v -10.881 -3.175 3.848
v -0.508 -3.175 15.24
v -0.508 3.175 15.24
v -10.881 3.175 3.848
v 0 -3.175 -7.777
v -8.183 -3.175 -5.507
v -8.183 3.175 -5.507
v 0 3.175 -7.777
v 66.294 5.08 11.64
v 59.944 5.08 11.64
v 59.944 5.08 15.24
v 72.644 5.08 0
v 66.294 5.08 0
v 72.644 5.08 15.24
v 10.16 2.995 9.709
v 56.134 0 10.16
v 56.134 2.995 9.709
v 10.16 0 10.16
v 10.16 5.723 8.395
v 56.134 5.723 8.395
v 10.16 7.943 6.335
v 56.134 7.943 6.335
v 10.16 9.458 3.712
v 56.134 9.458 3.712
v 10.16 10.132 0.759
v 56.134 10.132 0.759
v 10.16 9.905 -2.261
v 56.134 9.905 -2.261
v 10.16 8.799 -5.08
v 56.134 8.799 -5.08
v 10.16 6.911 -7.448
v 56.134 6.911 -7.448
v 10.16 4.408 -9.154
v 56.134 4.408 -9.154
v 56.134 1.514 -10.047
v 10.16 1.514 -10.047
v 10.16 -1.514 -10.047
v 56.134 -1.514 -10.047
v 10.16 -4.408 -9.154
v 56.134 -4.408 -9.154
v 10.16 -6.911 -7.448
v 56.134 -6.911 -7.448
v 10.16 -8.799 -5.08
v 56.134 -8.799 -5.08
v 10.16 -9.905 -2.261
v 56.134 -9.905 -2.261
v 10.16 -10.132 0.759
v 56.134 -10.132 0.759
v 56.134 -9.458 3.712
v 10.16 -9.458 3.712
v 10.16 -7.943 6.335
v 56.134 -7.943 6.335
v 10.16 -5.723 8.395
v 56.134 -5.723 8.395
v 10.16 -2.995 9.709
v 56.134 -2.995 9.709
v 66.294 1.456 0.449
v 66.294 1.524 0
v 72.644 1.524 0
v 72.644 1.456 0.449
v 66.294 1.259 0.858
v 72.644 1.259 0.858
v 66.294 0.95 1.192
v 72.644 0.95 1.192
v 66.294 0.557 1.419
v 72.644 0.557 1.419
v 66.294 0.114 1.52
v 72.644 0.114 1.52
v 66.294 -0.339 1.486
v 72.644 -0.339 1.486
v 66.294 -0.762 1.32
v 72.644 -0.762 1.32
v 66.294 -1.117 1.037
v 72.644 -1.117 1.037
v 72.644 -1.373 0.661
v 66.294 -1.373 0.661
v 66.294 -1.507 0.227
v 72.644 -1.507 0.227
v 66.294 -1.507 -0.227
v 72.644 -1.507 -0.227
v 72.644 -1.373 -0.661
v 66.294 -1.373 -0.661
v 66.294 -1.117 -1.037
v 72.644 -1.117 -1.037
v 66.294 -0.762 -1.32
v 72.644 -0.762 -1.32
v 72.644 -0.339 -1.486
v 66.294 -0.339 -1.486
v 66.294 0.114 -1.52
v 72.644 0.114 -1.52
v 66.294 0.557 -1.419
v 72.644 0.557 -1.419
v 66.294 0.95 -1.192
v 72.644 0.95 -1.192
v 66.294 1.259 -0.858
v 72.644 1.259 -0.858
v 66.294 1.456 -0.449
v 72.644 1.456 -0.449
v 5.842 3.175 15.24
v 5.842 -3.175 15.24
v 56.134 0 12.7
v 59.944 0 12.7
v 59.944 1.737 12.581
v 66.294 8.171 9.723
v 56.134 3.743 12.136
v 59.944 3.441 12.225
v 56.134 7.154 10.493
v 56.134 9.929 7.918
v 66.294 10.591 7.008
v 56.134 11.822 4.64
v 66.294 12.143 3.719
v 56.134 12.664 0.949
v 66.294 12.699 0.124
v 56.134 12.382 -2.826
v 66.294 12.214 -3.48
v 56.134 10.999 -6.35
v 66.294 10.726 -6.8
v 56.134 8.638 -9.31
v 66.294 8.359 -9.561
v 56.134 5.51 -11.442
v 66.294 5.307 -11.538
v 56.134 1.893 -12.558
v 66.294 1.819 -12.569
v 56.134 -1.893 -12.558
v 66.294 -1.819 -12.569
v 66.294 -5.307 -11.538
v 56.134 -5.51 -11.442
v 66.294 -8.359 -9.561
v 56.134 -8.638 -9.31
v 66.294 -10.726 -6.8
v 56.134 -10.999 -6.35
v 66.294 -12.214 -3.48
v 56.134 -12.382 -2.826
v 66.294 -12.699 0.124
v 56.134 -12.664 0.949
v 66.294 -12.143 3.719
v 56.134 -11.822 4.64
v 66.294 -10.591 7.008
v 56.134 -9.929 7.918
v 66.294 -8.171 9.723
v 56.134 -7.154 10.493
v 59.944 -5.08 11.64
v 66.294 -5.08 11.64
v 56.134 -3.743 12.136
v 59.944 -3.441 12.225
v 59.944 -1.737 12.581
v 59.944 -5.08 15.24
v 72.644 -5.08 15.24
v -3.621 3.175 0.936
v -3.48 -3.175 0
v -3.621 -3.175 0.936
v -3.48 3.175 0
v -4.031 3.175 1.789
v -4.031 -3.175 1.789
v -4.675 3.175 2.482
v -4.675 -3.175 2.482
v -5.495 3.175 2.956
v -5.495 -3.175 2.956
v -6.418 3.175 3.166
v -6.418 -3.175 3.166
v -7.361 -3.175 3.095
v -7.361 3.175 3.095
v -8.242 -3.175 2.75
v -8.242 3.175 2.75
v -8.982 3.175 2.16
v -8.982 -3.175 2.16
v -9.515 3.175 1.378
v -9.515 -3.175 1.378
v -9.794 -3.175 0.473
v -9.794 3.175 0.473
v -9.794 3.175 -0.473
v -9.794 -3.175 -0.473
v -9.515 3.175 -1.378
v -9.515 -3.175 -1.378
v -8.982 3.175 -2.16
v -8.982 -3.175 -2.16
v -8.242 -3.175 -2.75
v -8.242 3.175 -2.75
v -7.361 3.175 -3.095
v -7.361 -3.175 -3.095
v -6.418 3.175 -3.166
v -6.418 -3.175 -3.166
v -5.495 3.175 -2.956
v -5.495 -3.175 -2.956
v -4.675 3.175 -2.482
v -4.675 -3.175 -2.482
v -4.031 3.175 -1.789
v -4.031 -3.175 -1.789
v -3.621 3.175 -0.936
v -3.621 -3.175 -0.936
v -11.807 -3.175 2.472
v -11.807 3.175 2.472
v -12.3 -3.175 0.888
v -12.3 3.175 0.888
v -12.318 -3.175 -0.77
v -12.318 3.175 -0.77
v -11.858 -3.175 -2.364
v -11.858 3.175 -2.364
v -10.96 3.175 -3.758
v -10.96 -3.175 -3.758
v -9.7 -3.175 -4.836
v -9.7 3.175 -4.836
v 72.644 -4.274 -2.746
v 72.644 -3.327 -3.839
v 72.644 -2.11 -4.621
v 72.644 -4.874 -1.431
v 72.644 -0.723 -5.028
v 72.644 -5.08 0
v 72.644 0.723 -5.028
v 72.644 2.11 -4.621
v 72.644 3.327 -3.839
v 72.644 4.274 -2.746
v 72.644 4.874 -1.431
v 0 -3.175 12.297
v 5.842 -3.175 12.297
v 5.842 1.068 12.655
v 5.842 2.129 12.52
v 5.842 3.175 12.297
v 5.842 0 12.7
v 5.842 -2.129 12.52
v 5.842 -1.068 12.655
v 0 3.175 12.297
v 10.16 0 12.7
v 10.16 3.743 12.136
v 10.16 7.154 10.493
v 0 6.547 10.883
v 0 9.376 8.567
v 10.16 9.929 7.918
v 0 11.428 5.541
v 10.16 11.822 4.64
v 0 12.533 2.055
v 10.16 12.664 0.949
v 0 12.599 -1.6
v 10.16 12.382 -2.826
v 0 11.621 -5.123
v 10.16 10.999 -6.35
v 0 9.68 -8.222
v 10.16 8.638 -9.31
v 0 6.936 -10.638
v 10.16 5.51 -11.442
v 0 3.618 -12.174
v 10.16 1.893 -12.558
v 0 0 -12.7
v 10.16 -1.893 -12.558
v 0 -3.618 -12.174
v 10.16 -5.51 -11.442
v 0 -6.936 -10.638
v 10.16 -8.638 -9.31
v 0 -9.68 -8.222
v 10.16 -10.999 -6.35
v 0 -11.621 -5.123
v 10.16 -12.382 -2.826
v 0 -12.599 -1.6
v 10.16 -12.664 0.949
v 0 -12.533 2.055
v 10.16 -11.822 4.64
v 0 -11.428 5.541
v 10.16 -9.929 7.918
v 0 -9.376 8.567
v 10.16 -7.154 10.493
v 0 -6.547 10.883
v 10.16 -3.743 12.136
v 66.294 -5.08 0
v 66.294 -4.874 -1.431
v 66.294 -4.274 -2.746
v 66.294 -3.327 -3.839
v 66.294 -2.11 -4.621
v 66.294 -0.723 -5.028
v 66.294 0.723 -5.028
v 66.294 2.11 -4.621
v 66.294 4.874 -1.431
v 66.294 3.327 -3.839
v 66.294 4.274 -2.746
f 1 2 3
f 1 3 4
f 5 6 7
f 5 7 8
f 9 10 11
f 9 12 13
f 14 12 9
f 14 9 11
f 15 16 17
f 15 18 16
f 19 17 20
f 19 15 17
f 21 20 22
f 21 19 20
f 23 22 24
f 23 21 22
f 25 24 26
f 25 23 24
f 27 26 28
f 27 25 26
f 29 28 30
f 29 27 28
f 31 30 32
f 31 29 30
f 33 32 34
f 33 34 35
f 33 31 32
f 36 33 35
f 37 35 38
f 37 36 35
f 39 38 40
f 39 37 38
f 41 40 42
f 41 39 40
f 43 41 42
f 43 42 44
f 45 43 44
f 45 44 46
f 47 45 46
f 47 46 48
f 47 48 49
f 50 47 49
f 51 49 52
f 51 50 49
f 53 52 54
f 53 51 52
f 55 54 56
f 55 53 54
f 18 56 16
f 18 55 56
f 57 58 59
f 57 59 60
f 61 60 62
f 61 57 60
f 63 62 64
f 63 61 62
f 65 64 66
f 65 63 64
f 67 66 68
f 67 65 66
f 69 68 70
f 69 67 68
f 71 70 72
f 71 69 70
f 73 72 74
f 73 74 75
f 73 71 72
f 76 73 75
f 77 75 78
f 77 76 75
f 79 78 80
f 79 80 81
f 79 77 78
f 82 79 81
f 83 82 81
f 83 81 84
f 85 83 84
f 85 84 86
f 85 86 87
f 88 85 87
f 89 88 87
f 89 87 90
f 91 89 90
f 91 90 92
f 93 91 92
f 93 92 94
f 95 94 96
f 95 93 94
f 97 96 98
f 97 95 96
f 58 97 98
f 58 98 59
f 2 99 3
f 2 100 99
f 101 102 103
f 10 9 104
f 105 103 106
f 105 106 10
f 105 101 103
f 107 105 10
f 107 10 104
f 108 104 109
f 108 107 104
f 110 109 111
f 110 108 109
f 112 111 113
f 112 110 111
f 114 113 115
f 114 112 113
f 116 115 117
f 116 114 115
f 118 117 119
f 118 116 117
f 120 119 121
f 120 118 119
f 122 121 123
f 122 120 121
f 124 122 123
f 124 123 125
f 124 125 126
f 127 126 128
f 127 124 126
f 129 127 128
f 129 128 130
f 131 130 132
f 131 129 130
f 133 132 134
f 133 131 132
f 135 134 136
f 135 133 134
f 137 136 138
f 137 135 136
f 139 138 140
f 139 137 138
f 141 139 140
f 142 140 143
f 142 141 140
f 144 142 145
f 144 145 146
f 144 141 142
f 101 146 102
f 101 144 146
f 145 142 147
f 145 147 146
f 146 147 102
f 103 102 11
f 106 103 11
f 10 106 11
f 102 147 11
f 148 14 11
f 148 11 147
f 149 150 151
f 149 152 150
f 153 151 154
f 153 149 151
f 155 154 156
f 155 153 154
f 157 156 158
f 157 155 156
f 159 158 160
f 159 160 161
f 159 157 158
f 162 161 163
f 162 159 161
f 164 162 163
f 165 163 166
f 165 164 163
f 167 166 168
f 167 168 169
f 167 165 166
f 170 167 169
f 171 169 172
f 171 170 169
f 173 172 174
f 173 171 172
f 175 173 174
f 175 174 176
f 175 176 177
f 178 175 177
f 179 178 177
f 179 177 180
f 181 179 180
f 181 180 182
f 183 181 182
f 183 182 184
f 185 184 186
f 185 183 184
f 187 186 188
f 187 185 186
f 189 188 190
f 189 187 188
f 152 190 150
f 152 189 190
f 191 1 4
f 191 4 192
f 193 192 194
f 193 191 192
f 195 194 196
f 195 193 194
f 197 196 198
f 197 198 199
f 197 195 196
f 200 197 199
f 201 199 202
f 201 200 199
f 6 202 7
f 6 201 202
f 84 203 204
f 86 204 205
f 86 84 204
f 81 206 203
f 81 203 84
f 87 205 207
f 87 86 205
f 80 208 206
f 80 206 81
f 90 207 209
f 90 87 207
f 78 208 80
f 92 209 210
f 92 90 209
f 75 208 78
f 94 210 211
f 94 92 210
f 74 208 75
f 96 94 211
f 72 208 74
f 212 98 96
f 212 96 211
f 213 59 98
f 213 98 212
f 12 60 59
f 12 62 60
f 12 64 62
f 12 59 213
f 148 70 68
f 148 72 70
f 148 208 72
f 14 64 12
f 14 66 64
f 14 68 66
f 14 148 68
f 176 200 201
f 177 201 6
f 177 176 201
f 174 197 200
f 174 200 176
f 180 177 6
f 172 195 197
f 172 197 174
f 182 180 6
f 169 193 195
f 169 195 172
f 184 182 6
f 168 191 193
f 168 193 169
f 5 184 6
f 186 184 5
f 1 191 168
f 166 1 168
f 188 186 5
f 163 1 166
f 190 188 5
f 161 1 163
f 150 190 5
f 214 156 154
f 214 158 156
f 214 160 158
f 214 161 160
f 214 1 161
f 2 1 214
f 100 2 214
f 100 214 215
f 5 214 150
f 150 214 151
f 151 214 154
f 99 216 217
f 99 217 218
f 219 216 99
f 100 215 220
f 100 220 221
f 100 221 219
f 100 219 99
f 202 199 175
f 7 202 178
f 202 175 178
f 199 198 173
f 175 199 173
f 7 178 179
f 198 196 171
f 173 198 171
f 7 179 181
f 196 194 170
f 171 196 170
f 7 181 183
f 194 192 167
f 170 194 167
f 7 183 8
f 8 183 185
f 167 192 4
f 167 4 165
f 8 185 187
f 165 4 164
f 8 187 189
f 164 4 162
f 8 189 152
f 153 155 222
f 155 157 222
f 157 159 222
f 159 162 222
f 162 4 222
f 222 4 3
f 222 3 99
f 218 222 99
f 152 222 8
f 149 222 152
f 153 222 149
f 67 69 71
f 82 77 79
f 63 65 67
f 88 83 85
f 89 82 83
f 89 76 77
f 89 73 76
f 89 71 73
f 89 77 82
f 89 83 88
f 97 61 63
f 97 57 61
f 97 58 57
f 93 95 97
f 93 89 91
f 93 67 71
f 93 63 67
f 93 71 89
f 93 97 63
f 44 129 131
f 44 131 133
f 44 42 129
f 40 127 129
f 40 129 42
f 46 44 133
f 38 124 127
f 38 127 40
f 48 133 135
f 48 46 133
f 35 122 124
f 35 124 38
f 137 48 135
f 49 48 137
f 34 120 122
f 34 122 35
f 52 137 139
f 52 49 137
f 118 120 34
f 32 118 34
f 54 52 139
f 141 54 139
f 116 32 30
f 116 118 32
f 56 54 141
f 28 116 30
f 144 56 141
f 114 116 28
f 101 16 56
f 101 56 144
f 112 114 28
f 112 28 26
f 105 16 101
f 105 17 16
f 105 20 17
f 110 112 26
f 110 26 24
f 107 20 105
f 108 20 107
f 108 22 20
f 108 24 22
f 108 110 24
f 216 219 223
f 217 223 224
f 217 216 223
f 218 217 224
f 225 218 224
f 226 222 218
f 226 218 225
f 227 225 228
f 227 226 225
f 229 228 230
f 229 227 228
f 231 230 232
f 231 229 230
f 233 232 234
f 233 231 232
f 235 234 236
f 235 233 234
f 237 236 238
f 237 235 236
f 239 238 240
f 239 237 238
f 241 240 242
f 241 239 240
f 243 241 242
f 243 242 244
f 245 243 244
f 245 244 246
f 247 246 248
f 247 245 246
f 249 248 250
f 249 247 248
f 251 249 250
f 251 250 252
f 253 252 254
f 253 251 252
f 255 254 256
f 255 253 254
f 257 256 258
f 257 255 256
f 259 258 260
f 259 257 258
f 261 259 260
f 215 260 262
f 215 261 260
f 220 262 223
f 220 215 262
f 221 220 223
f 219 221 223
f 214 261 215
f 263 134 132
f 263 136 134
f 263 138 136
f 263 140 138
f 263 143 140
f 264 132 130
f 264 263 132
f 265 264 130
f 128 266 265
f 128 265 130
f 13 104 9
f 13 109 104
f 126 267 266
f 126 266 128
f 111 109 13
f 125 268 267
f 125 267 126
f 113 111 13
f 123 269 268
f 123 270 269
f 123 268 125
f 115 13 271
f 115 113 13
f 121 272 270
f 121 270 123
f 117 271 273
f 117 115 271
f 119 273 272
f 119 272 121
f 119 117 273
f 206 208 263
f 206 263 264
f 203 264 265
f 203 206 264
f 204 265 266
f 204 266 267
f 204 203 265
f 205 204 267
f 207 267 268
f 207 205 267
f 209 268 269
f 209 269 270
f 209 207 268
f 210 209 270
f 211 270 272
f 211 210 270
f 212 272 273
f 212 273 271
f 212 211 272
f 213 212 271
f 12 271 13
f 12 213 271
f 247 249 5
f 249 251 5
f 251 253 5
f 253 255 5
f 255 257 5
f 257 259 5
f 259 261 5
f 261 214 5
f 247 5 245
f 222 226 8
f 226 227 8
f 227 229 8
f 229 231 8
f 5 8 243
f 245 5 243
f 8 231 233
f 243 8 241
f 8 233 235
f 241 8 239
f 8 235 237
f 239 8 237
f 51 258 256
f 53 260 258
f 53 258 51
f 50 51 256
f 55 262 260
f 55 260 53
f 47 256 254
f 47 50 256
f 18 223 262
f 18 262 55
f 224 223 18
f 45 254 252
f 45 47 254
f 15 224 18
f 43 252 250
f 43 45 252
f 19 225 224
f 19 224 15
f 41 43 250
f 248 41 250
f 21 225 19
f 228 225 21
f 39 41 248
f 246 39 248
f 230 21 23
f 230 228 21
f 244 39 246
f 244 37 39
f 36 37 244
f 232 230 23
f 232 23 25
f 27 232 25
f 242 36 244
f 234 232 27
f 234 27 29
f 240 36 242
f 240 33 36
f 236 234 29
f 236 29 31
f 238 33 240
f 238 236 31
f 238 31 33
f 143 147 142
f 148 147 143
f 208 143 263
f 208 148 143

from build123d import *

# Parameters (mm, degrees)
F0_W     = 5.842
F0_H     = 12.7
F0_R     = 3.175
F2_DEPTH = 3.175
F3_R     = 1.524
F4_DEPTH = 6.35


with BuildPart() as f1:
    # F0 (on Front) → F1 (revolve)
    with BuildSketch(Plane.XZ):
        Polygon((5.842, 12.7), (5.842, 0), (66.294, 0), (66.294, 12.7), (56.134, 12.7), (56.134, 10.16), (10.16, 10.16), (10.16, 12.7), align=None)
        with Locations((2.921, 6.35)):
            Rectangle(F0_W, F0_H)
    revolve(axis=Axis((33.147, 0, 0), (-1, 0, 0)))

    # F0 (on Front) → F2 (join, symmetric)
    with BuildSketch(Plane.XZ):
        with BuildLine():
            Line((-0.9398, 0), (0, 0))
            Line((0, 0), (0, 12.7))
            Line((0, 12.7), (5.842, 12.7))
            Line((5.842, 12.7), (5.842, 15.24))
            Line((5.842, 15.24), (-0.508, 15.24))
            Line((-0.508, 15.24), (-10.8806298187, 3.8475430269))
            ThreePointArc((-10.8806298187, 3.8475430269), (-4.5919612295, 5.3297205562), (-0.9398, 0))
        make_face()
        with Locations((2.921, 6.35)):
            Rectangle(F0_W, F0_H)
        with BuildLine():
            Line((5.842, 0), (0, 0))
            Line((0, 0), (-0.9398, 0))
            ThreePointArc((-0.9398, 0), (-3.1957909266, -4.5493385486), (-8.1826630726, -5.5069827884))
            Line((-8.1826630726, -5.5069827884), (5.842, -9.398))
            Line((5.842, -9.398), (5.842, 0))
        make_face()
        with BuildLine():
            ThreePointArc((-8.1826630726, -5.5069827884), (-3.1957909266, -4.5493385486), (-0.9398, 0))
            ThreePointArc((-0.9398, 0), (-4.5919612295, 5.3297205562), (-10.8806298187, 3.8475430269))
            ThreePointArc((-10.8806298187, 3.8475430269), (-12.1459778134, -1.5837270034), (-8.1826630726, -5.5069827884))
        make_face()
        with Locations((-6.6548, 0)):
            Circle(F0_R, mode=Mode.SUBTRACT)
    extrude(amount=F2_DEPTH, both=True)

    # F3 (on face) → F4 (join, symmetric)
    with BuildSketch(Plane.YZ.offset(66.294)):
        with BuildLine():
            ThreePointArc((-5.08, 0), (0, 5.08), (5.08, 0))
            Line((5.08, 0), (5.08, 11.6397422652))
            ThreePointArc((5.08, 11.6397422652), (0, 12.7), (-5.08, 11.6397422652))
            Line((-5.08, 11.6397422652), (-5.08, 0))
        make_face()
        with BuildLine():
            ThreePointArc((-5.08, 0), (0, -5.08), (5.08, 0))
            ThreePointArc((5.08, 0), (0, 5.08), (-5.08, 0))
        make_face()
        Circle(F3_R, mode=Mode.SUBTRACT)
        with BuildLine():
            ThreePointArc((-5.08, 11.6397422652), (0, 12.7), (5.08, 11.6397422652))
            Line((5.08, 11.6397422652), (5.08, 15.24))
            Line((5.08, 15.24), (-5.08, 15.24))
            Line((-5.08, 15.24), (-5.08, 11.6397422652))
        make_face()
    extrude(amount=F4_DEPTH, both=True)


solid = f1.part
